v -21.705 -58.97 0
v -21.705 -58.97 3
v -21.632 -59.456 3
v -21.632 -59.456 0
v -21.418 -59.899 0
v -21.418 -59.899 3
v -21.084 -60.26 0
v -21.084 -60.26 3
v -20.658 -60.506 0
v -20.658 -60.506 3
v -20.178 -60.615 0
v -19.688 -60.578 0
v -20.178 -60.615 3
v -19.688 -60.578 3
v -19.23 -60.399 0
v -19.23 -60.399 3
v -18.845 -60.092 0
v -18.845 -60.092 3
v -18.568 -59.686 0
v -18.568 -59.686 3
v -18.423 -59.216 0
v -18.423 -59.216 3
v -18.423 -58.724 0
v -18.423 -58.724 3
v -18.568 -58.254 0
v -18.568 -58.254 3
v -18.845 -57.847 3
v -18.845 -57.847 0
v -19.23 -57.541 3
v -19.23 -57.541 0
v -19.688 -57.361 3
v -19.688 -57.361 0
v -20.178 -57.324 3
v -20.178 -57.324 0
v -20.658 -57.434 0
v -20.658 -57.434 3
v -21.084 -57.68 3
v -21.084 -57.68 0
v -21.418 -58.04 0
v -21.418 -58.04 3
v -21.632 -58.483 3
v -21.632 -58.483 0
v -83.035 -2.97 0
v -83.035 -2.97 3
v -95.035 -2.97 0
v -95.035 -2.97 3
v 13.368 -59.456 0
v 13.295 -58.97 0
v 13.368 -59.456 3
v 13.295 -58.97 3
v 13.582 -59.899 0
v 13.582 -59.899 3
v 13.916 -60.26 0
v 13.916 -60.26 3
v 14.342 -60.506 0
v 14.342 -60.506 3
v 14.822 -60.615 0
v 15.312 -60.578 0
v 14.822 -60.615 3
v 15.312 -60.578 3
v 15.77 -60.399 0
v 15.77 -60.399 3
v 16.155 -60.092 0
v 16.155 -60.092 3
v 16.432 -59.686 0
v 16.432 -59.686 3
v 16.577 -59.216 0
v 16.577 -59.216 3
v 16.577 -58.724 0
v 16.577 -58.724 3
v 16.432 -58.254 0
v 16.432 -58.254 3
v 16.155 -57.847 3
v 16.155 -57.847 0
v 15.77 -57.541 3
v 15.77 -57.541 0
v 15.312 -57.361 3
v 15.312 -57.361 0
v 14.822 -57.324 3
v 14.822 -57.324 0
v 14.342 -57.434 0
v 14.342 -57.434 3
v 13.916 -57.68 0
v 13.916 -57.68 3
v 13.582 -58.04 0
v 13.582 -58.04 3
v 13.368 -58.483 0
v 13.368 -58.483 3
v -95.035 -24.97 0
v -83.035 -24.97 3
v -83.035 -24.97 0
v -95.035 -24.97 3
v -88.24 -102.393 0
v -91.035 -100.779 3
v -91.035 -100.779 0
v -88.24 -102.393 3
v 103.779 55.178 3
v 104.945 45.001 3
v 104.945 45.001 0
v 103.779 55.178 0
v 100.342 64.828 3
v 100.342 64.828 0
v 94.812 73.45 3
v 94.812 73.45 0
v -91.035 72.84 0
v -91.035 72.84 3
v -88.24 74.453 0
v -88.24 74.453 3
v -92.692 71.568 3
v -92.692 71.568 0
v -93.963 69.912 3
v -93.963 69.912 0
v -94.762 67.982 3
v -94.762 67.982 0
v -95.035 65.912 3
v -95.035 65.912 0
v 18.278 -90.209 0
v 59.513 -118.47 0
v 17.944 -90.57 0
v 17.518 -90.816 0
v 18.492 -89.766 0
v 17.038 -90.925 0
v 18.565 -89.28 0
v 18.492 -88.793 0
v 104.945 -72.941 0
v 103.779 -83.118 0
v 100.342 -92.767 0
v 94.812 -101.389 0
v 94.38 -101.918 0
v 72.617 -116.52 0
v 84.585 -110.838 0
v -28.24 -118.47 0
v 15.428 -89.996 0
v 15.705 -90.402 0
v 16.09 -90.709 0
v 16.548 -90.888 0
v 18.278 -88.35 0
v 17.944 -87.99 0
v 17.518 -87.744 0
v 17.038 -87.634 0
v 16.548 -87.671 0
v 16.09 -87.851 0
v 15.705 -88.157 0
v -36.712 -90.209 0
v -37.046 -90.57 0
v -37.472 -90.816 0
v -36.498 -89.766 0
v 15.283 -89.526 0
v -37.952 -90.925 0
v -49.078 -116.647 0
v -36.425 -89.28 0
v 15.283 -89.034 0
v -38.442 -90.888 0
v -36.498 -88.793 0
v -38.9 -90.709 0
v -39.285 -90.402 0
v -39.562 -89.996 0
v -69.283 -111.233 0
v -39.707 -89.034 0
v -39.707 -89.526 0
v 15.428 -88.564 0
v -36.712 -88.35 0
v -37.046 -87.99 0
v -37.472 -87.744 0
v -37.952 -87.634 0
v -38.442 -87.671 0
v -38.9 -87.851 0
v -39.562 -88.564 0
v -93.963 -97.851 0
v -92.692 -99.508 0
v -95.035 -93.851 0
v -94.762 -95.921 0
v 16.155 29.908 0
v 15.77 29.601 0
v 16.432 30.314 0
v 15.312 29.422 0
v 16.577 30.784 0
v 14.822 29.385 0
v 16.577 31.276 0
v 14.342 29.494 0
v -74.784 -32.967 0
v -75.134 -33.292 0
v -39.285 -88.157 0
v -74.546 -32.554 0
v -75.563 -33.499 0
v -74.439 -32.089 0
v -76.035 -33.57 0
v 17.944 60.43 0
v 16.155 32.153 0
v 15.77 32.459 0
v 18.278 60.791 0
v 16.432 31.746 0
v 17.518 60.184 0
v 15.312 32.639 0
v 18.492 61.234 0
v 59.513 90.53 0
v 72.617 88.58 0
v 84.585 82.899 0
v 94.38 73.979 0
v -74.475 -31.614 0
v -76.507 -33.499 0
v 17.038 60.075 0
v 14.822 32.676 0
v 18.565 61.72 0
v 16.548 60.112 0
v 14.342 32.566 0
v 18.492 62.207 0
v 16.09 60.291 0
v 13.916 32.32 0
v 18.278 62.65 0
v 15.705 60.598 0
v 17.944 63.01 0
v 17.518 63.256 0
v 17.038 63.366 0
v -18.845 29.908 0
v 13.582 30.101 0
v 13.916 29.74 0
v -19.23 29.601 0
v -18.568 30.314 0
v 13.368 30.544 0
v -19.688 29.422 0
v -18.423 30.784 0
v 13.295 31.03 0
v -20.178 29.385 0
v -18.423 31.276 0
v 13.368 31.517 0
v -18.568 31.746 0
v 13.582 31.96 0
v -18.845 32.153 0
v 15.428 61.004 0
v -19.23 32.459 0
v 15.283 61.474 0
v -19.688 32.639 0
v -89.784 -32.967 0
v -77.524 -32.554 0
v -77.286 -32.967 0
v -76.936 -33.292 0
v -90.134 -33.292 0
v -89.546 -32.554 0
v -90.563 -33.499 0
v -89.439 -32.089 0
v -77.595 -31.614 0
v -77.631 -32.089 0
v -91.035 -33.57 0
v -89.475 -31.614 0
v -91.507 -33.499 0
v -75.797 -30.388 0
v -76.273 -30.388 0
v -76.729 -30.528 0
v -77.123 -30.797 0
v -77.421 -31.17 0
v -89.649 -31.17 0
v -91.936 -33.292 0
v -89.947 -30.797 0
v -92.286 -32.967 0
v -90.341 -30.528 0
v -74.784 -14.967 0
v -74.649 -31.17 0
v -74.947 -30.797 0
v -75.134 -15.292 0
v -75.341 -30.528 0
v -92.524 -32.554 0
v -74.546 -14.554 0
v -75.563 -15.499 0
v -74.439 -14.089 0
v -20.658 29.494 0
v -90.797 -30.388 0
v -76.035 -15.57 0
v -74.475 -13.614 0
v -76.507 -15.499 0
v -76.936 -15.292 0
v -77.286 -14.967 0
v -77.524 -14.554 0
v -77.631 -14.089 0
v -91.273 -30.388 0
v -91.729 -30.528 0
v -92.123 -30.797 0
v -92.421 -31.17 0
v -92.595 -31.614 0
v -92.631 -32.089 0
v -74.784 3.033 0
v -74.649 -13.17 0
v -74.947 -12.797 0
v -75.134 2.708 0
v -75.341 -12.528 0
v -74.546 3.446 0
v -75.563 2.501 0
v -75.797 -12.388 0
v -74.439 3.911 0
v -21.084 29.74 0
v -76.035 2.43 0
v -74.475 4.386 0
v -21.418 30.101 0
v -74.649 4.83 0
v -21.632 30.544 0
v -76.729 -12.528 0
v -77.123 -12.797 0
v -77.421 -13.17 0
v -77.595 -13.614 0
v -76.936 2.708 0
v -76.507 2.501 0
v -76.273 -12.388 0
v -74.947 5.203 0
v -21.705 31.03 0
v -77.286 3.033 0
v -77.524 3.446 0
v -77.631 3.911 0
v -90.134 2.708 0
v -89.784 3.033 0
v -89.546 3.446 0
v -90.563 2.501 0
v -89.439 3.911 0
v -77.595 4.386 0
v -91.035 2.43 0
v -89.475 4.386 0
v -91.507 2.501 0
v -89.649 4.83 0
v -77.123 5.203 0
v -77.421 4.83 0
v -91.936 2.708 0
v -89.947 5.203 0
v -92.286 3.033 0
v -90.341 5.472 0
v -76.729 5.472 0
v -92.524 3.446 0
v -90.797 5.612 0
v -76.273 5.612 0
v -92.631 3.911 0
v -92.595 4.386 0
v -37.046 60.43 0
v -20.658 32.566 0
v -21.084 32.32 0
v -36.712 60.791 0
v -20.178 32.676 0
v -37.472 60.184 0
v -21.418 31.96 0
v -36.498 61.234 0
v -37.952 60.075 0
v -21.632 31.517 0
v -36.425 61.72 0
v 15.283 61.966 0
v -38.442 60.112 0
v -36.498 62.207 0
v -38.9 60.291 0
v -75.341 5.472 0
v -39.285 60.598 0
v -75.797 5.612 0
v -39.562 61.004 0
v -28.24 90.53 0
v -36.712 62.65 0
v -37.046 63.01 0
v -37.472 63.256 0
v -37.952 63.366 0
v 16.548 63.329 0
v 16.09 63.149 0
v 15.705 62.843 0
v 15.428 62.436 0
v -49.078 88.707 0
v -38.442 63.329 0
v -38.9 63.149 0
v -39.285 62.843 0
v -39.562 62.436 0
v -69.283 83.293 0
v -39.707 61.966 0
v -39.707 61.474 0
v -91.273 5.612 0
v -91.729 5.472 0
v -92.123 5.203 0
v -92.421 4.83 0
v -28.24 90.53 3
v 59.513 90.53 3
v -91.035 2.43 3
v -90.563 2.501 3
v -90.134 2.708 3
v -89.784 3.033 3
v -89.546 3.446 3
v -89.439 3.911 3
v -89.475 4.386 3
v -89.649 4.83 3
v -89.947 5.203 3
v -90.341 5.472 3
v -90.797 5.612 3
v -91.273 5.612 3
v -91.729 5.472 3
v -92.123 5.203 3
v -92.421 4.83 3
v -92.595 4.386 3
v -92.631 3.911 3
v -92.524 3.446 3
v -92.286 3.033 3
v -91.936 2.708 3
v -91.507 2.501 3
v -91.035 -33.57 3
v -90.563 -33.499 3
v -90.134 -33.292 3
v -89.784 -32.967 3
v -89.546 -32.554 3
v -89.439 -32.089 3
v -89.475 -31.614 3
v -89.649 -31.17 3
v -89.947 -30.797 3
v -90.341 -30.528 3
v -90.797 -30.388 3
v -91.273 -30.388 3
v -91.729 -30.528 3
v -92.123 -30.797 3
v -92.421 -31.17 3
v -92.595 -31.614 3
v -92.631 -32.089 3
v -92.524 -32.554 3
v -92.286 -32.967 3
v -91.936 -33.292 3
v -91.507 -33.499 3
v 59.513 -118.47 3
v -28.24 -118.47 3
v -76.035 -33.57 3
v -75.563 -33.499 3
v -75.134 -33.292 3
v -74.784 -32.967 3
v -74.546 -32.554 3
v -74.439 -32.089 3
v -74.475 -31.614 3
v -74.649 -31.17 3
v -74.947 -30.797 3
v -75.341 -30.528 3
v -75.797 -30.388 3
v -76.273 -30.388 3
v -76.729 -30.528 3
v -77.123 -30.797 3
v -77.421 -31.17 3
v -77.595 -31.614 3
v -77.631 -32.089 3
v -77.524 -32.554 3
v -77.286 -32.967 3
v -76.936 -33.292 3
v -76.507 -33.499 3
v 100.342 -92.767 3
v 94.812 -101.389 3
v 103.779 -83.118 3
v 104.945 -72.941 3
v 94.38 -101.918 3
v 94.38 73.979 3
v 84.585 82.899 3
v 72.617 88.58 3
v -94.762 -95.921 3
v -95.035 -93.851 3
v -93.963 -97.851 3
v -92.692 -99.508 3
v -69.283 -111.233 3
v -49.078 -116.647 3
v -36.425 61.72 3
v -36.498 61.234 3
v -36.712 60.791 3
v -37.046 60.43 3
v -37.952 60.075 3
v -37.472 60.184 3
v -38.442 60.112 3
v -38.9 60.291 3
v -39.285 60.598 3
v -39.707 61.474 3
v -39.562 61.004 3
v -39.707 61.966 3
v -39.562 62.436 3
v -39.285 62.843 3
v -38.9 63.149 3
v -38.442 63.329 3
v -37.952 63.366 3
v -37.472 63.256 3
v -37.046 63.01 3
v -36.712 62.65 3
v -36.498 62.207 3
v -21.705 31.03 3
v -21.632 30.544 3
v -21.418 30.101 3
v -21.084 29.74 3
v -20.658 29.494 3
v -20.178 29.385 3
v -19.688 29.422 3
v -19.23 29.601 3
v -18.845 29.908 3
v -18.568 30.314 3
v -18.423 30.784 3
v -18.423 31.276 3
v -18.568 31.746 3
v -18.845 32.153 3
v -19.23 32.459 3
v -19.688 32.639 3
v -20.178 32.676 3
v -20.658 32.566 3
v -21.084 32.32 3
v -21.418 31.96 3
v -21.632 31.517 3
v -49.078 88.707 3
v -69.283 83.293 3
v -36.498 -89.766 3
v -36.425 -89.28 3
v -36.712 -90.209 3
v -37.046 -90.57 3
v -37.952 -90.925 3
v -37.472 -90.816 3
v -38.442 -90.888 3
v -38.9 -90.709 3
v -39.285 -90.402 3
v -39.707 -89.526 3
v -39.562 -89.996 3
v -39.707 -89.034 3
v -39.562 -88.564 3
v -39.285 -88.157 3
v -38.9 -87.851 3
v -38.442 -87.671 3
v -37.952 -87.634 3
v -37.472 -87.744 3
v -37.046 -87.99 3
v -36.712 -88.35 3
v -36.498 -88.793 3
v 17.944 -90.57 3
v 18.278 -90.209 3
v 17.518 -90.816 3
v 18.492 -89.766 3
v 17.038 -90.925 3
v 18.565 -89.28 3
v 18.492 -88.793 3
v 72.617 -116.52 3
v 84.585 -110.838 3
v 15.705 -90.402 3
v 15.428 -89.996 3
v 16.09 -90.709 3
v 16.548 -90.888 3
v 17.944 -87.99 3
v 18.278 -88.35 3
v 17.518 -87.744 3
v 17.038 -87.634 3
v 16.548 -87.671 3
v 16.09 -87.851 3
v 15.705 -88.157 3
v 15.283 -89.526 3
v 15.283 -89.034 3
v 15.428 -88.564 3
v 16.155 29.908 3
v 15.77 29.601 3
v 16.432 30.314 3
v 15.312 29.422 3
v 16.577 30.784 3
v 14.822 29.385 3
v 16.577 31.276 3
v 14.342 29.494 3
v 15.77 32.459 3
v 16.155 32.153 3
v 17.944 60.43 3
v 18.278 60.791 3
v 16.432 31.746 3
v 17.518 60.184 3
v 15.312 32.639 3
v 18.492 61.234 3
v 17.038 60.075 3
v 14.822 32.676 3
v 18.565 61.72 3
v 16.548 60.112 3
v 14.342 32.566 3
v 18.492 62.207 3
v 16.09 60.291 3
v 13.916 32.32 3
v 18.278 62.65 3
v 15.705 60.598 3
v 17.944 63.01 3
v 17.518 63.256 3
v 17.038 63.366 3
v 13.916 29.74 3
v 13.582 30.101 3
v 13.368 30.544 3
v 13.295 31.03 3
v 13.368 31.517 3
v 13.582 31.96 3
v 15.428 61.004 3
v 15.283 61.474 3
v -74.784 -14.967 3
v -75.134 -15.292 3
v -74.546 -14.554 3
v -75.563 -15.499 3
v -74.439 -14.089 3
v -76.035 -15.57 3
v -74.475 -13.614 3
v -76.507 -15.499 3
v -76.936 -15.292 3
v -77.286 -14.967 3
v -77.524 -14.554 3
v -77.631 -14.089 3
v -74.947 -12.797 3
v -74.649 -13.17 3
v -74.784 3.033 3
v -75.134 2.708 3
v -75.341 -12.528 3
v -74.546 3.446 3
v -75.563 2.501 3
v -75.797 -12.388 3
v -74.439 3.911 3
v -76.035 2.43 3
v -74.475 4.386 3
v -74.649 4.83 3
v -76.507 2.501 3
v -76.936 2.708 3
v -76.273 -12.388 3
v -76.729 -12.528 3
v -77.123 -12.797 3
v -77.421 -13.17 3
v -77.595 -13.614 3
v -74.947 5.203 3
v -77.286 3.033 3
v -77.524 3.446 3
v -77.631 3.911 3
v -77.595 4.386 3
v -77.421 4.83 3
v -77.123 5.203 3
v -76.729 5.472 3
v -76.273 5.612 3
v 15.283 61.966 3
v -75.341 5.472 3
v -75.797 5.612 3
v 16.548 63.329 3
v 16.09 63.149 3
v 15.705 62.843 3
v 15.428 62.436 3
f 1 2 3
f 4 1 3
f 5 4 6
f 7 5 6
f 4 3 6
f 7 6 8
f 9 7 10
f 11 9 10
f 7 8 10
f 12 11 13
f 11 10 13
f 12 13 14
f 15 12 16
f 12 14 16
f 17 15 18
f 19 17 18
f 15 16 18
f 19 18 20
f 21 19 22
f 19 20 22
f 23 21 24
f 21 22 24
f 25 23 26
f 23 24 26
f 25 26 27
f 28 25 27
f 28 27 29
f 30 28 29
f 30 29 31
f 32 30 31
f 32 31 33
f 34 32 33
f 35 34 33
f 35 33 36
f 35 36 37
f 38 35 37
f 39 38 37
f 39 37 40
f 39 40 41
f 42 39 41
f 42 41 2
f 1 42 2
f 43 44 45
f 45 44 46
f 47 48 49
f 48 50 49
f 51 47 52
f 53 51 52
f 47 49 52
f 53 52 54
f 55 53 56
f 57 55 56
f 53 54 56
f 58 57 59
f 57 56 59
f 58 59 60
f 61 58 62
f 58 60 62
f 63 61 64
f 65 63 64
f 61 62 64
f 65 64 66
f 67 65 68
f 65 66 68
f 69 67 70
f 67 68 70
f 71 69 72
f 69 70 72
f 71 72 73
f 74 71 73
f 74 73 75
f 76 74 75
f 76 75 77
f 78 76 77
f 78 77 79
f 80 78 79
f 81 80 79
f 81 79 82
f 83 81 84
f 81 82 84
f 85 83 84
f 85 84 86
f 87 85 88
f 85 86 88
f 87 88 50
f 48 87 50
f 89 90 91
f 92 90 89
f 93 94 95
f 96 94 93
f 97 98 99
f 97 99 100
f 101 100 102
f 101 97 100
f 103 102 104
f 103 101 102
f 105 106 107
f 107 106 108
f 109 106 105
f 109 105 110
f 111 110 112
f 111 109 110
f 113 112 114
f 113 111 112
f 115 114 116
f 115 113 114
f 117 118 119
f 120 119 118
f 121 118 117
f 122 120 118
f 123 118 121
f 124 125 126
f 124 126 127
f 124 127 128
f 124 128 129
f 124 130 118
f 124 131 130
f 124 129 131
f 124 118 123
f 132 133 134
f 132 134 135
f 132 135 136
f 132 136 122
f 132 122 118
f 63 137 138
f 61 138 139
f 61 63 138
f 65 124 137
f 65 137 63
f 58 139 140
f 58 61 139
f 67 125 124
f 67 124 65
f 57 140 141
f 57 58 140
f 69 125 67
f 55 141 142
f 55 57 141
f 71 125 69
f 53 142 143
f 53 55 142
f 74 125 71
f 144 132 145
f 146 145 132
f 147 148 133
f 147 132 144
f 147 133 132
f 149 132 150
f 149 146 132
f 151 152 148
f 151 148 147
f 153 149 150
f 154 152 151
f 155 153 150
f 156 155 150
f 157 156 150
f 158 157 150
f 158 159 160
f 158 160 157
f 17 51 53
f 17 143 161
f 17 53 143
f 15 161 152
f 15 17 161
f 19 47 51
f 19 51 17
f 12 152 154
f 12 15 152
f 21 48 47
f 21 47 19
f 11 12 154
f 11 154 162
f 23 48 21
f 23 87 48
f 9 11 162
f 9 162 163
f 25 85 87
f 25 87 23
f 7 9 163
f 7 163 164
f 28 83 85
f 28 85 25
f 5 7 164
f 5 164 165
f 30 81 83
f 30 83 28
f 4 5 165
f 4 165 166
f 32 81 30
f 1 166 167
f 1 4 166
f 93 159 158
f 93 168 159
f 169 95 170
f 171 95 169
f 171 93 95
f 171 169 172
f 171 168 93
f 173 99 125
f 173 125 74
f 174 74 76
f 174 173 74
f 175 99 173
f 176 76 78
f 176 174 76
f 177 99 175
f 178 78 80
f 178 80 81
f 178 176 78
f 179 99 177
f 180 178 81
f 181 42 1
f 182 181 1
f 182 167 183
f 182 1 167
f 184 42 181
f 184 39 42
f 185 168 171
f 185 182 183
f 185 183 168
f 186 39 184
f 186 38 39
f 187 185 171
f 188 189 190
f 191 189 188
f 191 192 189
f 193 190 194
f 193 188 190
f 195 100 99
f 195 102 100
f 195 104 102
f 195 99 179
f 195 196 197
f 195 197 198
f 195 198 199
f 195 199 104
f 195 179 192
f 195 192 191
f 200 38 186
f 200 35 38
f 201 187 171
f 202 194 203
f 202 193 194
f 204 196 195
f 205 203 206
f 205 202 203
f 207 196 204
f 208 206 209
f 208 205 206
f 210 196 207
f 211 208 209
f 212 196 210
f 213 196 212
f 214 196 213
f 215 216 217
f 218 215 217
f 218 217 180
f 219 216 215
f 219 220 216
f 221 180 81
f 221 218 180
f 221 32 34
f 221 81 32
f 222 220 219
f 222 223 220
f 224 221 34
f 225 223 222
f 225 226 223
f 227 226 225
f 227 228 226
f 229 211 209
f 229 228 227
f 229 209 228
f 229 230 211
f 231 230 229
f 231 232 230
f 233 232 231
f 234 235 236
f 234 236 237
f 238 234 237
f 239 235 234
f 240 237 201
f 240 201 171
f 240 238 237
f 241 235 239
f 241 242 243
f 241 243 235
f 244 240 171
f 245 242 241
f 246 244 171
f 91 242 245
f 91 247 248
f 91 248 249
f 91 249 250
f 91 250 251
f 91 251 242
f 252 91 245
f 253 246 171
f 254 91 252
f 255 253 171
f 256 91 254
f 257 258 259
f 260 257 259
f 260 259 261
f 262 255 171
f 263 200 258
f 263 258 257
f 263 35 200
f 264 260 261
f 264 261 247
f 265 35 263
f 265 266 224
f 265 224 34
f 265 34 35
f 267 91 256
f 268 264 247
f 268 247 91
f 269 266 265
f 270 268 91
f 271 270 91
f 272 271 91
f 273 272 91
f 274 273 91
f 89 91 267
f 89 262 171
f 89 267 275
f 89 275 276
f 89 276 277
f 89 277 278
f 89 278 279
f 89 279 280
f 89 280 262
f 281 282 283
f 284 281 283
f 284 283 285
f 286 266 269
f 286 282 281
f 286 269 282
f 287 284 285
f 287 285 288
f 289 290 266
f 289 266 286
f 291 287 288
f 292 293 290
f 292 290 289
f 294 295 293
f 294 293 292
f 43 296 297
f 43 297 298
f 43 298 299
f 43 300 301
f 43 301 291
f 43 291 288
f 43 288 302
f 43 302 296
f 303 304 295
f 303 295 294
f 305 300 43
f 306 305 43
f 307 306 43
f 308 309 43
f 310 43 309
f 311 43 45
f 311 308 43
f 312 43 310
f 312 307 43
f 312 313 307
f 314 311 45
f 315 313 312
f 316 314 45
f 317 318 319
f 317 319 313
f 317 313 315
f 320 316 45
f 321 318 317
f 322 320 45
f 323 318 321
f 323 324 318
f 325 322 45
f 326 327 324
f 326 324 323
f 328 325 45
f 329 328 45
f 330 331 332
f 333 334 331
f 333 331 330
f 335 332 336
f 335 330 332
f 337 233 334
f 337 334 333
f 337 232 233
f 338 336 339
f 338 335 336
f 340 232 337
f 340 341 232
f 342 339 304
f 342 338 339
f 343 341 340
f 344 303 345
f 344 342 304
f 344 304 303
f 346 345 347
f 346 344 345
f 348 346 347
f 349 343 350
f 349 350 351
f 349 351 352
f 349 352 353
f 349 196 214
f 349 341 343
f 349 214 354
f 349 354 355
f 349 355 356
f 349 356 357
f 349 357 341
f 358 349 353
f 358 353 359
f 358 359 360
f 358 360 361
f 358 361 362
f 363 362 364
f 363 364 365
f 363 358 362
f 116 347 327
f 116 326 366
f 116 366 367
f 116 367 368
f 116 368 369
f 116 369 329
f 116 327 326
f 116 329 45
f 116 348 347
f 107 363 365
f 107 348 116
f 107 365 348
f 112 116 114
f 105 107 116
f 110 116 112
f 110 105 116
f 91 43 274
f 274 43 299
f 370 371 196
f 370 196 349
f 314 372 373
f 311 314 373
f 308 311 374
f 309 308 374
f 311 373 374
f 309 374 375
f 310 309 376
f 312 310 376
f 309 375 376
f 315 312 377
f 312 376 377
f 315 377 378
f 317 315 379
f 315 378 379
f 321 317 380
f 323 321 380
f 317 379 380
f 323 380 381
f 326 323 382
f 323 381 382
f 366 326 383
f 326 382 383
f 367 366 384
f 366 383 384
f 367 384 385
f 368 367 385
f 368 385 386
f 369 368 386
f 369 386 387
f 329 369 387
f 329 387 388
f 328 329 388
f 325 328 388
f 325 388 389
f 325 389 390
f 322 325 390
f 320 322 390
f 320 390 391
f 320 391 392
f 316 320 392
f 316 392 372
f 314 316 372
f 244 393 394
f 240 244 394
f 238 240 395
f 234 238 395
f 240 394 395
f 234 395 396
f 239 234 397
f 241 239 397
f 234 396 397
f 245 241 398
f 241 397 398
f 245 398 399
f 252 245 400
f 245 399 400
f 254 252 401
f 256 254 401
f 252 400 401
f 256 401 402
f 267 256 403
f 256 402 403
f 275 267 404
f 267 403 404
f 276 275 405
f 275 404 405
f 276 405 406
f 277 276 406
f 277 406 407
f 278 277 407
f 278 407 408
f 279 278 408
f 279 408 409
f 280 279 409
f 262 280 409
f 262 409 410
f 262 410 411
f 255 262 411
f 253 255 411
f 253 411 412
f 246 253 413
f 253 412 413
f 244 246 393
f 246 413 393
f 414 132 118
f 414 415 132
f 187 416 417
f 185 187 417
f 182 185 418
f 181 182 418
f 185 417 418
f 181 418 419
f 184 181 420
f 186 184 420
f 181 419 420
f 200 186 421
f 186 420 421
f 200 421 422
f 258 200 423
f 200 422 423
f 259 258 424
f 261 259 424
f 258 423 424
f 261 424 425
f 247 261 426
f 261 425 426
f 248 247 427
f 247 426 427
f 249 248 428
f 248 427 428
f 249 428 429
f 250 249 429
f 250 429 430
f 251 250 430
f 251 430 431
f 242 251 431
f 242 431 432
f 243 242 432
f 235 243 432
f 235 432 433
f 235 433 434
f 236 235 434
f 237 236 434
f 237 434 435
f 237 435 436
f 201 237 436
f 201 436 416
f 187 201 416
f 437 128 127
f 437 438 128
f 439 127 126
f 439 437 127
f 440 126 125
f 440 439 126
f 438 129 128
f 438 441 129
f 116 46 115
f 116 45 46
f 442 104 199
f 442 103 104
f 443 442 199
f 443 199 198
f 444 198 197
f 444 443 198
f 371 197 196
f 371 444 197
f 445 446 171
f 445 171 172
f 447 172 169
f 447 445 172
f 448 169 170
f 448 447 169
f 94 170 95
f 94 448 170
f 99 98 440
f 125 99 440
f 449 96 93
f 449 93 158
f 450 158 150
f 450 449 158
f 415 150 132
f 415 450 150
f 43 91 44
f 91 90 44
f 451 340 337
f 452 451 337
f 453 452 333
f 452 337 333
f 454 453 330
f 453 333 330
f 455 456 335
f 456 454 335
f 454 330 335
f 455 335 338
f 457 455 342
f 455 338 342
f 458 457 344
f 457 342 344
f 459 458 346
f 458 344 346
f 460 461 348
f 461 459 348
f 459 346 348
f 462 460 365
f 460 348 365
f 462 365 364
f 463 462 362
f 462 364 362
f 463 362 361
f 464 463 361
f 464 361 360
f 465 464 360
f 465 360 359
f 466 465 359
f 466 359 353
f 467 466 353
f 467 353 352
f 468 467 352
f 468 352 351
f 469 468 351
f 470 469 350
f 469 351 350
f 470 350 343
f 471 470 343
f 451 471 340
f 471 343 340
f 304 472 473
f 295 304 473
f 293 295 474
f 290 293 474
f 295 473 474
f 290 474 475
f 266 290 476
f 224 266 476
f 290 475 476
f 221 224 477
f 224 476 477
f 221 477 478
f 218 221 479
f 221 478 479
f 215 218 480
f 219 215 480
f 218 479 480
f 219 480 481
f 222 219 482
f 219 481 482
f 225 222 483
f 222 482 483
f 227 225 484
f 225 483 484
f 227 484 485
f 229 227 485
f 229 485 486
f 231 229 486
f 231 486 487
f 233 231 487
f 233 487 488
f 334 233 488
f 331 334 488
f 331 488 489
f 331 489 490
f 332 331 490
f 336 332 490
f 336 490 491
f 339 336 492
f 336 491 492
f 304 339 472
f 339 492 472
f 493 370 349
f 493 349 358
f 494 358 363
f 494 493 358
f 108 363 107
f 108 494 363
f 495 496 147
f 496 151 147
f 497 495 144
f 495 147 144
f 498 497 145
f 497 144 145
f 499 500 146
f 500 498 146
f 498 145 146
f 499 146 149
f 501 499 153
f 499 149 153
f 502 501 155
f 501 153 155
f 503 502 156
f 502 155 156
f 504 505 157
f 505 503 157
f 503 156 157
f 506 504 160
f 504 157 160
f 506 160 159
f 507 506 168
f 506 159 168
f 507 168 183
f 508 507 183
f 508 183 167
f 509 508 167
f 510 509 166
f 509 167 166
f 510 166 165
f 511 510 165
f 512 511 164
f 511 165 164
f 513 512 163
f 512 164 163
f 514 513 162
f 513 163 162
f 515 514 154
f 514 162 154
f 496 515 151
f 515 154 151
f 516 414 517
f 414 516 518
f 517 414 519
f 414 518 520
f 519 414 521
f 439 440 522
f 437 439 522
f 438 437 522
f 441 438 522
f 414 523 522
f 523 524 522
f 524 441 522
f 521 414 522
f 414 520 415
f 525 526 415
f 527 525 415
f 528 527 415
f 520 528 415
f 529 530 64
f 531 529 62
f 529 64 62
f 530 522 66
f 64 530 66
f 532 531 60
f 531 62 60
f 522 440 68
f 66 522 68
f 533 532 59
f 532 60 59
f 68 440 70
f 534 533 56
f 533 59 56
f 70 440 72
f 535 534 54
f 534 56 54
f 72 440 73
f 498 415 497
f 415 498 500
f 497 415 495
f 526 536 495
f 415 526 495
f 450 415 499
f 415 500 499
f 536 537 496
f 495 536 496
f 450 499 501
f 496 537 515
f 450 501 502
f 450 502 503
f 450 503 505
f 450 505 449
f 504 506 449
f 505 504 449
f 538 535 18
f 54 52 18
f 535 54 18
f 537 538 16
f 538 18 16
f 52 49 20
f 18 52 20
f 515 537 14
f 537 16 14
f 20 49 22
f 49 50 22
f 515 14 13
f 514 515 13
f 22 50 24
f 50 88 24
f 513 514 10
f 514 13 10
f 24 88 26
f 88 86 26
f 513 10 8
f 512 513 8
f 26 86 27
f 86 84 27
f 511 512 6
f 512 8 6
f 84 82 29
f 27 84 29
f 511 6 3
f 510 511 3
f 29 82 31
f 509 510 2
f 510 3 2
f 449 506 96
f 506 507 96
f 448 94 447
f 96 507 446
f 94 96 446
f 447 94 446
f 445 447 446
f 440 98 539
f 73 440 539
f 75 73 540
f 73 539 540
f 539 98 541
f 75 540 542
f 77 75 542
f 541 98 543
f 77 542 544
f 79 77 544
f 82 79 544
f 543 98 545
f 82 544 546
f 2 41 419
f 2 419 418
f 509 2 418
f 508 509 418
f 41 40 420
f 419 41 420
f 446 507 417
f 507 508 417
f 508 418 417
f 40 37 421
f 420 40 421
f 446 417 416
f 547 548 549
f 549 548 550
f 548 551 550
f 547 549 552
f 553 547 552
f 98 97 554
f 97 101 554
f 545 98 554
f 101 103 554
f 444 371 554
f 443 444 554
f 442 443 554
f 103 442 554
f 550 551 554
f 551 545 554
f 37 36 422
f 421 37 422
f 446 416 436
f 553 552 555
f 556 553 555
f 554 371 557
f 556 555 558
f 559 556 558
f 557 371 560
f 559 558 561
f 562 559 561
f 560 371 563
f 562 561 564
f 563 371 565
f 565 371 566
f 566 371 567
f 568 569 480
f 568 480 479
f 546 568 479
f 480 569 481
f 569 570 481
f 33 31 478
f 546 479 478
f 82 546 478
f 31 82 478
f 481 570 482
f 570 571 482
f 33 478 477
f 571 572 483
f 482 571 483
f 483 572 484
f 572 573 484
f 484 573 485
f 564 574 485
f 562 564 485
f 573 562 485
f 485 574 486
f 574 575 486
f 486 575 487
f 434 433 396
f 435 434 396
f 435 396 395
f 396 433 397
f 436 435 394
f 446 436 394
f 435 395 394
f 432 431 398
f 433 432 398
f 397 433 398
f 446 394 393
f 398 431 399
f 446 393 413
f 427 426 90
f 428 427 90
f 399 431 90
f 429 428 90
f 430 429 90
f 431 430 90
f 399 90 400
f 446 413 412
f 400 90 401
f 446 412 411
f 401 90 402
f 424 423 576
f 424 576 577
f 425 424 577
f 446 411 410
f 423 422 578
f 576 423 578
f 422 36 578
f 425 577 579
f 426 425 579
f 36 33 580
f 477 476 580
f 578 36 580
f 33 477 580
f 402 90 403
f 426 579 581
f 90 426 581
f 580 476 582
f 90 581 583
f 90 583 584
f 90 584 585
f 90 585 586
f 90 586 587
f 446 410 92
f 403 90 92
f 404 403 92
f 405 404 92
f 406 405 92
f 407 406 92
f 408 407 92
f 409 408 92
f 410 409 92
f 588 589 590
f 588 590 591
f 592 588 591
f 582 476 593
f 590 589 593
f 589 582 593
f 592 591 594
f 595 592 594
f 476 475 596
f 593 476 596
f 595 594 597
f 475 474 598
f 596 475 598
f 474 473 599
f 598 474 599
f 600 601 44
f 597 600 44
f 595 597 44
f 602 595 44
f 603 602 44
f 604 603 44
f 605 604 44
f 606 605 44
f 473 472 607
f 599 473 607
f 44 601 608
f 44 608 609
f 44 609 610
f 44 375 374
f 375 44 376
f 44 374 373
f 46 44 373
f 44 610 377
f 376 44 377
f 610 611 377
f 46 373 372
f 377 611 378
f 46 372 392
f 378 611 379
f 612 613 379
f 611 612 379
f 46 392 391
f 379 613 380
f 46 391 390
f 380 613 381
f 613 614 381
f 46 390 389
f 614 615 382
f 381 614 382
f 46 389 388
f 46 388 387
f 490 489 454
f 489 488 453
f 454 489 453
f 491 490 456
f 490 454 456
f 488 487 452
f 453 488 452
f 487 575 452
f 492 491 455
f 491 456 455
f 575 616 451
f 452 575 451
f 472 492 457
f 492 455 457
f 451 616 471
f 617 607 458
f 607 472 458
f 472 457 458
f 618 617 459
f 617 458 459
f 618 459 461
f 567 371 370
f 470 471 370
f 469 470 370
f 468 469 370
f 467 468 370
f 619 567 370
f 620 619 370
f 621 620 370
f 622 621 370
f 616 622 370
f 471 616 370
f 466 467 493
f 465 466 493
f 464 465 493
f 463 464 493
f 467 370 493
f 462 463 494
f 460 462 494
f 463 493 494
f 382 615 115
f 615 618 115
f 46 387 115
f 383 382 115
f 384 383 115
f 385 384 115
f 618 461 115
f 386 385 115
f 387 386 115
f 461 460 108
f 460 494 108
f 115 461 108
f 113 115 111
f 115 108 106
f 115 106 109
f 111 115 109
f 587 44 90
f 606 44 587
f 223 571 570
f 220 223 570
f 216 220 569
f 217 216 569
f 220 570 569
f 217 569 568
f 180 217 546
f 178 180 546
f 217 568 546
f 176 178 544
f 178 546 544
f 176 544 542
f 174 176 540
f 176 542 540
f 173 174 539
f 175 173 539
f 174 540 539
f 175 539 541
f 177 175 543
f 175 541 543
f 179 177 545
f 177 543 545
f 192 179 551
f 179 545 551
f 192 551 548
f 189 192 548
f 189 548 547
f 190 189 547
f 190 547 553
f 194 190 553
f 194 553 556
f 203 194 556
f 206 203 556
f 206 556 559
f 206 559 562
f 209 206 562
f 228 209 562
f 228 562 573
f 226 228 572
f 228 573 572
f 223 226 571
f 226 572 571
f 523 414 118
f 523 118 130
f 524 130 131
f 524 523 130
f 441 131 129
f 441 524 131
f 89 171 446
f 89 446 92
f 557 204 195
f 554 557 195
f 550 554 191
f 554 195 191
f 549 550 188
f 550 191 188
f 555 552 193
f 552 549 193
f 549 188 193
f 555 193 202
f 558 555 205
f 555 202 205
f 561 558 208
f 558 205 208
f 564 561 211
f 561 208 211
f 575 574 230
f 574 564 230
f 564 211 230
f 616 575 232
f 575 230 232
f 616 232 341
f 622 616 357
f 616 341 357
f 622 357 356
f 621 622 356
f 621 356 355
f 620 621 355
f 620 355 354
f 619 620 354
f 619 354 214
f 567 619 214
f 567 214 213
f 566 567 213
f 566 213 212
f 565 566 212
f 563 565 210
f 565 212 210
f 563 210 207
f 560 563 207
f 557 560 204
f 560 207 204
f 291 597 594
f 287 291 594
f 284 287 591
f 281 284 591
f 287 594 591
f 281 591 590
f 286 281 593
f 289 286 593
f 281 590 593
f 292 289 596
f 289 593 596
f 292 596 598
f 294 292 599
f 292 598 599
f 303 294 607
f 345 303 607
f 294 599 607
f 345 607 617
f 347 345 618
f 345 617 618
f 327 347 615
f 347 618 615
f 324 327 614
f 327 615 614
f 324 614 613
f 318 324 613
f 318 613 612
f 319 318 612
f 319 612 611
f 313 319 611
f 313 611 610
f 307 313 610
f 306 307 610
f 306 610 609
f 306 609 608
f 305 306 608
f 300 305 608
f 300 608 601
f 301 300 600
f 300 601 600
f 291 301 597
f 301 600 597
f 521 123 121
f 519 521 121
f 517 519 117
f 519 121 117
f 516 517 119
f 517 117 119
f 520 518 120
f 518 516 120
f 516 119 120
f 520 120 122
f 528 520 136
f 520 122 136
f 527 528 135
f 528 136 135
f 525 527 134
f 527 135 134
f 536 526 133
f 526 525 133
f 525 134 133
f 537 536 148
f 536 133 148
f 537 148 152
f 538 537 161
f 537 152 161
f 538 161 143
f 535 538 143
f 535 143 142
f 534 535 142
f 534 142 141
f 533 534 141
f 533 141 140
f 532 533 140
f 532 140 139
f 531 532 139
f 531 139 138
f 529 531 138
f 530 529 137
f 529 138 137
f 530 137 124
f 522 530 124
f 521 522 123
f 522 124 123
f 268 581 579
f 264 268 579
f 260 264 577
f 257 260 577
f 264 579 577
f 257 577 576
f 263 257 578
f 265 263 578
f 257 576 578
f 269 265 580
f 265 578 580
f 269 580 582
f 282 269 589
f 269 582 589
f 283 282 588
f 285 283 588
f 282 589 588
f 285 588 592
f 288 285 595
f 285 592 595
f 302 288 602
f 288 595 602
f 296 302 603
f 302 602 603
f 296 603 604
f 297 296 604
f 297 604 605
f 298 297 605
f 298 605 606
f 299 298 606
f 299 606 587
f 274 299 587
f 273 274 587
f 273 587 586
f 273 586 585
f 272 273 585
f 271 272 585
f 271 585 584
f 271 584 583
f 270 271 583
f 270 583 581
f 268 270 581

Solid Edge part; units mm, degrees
sketch "Sketch1" plane through (0, 0, 0) normal (0, 0, 1) x (1, 0, 0)
  circle A0 centre (-38.075, 61.7203) radius 1.65
  circle A1 centre (16.915, 61.7203) radius 1.65
  line L0 (-95.035, 70.5303) -> (94.945, 70.5303)
  line L1 (94.945, 70.5303) -> (94.945, -98.4697)
  line L2 (94.945, -98.4697) -> (-95.035, -98.4697)
  line L3 (-95.035, -98.4697) -> (-95.035, 70.5303)
  circle A2 centre (16.915, -89.2797) radius 1.65
  circle A3 centre (-38.075, -89.2797) radius 1.65
  dimension "D1" = 189.98
  dimension "D2" = 169
  dimension "D3" = 3.3
  dimension "D4" = 3.3
  dimension "D5" = 3.3
  dimension "D6" = 3.3
  dimension "D7" = 56.96
  dimension "D8" = 54.99
  dimension "D9" = 9.19
  dimension "D10" = 151
  dimension "D11" = 8.81
extrude "Protrusion1" add sketch "Sketch1" along normal blind 3
sketch "Sketch2" plane through (-0.045, -13.9697, 3) normal (0, 0, 1) x (-1, 0, 0)
  circle A0 centre (-14.99, 45) radius 1.65
  circle A1 centre (20.01, 45) radius 1.65
  circle A2 centre (20.01, -45) radius 1.65
  circle A3 centre (-14.99, -45) radius 1.65
  dimension "D1" = 3.3
  dimension "D2" = 3.3
  dimension "D3" = 3.3
  dimension "D4" = 3.3
  dimension "D5" = 90
  dimension "D6" = 35
  dimension "D7" = 39.5
  dimension "D8" = 39.5
  dimension "D9" = 80
extrude "Cutout1" cut sketch "Sketch2" against normal up to next
sketch "Sketch3" plane through (-0.045, -13.9697, 3) normal (0, 0, 1) x (0, -1, 0)
  circle A0 centre (-18, -75.99) radius 1.6
  circle A1 centre (-18, -90.99) radius 1.6
  circle A2 centre (0, -75.99) radius 1.6
  circle A3 centre (18, -75.99) radius 1.6
  circle A4 centre (18, -90.99) radius 1.6
  line L0 (11, -82.99) -> (-11, -82.99)
  line L1 (-11, -82.99) -> (-11, -94.99)
  line L2 (11, -94.99) -> (-11, -94.99)
  line L3 (11, -82.99) -> (11, -94.99)
  dimension "D1" = 18
  dimension "D2" = 18
  dimension "D3" = 15
  dimension "D4" = 4
extrude "Cutout2" cut sketch "Sketch3" against normal up to next
sketch "Sketch4" plane through (-0.045, -13.9697, 3) normal (0, 0, 1) x (0, 1, 0)
  arc A0 (-88.423, 88.1951) -> (-104.5, 28.1951) centre (15.5, 28.1951) ccw
  line L0 (-104.5, 28.1951) -> (-104.5, -59.5584)
  arc A1 (-104.5, -59.5584) -> (-87.9484, -94.4252) centre (-59.5, -59.5584) ccw
  line L1 (-87.9484, -94.4252) -> (-87.4195, -94.8567)
  arc A2 (-58.9711, -104.99) -> (-87.4195, -94.8567) centre (-58.9711, -59.99) cw
  line L2 (58.9711, -104.99) -> (-58.9711, -104.99)
  arc A3 (58.9711, -104.99) -> (87.4195, -94.8567) centre (58.9711, -59.99) ccw
  line L3 (87.4195, -94.8567) -> (87.9484, -94.4252)
  arc A4 (104.5, -59.5584) -> (87.9484, -94.4252) centre (59.5, -59.5584) cw
  line L4 (104.5, -59.5584) -> (104.5, 0)
  line L5 (104.5, 28.1951) -> (104.5, 0)
  arc A5 (88.423, 88.1951) -> (104.5, 28.1951) centre (-15.5, 28.1951) cw
  line L6 (84.5, 94.99) -> (88.423, 88.1951)
  line L7 (84.5, -94.99) -> (84.5, 94.99)
  line L8 (-84.5, -94.99) -> (84.5, -94.99)
  line L9 (-84.5, 94.99) -> (-84.5, -94.99)
  line L10 (-84.5, 94.99) -> (-88.423, 88.1951)
extrude "ExtrudedProtrusion_2" add sketch "Sketch4" against normal blind 3
fillet "Round_3" radius 8 2 edges at (-95.035, 70.5303, 1.5) (-95.035, -98.4697, 1.5)
